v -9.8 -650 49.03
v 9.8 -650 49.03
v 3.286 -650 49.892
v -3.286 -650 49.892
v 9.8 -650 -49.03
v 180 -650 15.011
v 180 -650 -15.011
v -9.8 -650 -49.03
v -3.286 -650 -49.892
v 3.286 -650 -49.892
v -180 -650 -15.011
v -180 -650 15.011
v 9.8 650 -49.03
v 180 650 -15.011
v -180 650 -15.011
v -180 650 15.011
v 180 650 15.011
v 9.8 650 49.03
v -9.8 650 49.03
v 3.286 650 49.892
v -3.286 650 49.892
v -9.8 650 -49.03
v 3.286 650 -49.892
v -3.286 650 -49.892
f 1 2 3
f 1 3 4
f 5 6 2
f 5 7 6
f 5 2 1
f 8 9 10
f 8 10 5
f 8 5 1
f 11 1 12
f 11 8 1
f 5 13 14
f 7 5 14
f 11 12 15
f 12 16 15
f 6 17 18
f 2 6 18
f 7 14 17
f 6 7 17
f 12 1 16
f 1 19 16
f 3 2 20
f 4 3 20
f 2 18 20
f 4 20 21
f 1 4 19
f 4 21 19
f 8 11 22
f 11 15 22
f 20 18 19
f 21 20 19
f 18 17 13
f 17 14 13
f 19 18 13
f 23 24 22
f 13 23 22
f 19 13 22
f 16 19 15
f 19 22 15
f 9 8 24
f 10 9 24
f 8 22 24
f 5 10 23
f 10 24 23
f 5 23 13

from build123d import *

# Parameters (mm, degrees)
EXTRUDE_1_DEPTH = 650


with BuildPart() as part:
    # 草图5 → 凸台-拉伸1 (new body, symmetric)
    with BuildSketch(Plane(origin=(0, 0, 0), x_dir=(1, 0, 0), z_dir=(0, 1, 0))):
        with BuildLine():
            Line((180, 0), (180, -15.011157988))
            Line((180, -15.011157988), (9.8, -49.030194778))
            ThreePointArc((9.8, -49.030194778), (0, -50), (-9.8, -49.030194778))
            Line((-9.8, -49.030194778), (-180, -15.011157988))
            Line((-180, -15.011157988), (-180, 0))
            Line((-180, 0), (-180, 15.011157988))
            Line((-180, 15.011157988), (-9.799999967, 49.030194785))
            ThreePointArc((-9.799999967, 49.030194785), (1.7e-08, 50), (9.8, 49.030194778))
            Line((9.8, 49.030194778), (180, 15.011157988))
            Line((180, 15.011157988), (180, 0))
        make_face()
    extrude(amount=EXTRUDE_1_DEPTH, both=True)


solid = part.part
